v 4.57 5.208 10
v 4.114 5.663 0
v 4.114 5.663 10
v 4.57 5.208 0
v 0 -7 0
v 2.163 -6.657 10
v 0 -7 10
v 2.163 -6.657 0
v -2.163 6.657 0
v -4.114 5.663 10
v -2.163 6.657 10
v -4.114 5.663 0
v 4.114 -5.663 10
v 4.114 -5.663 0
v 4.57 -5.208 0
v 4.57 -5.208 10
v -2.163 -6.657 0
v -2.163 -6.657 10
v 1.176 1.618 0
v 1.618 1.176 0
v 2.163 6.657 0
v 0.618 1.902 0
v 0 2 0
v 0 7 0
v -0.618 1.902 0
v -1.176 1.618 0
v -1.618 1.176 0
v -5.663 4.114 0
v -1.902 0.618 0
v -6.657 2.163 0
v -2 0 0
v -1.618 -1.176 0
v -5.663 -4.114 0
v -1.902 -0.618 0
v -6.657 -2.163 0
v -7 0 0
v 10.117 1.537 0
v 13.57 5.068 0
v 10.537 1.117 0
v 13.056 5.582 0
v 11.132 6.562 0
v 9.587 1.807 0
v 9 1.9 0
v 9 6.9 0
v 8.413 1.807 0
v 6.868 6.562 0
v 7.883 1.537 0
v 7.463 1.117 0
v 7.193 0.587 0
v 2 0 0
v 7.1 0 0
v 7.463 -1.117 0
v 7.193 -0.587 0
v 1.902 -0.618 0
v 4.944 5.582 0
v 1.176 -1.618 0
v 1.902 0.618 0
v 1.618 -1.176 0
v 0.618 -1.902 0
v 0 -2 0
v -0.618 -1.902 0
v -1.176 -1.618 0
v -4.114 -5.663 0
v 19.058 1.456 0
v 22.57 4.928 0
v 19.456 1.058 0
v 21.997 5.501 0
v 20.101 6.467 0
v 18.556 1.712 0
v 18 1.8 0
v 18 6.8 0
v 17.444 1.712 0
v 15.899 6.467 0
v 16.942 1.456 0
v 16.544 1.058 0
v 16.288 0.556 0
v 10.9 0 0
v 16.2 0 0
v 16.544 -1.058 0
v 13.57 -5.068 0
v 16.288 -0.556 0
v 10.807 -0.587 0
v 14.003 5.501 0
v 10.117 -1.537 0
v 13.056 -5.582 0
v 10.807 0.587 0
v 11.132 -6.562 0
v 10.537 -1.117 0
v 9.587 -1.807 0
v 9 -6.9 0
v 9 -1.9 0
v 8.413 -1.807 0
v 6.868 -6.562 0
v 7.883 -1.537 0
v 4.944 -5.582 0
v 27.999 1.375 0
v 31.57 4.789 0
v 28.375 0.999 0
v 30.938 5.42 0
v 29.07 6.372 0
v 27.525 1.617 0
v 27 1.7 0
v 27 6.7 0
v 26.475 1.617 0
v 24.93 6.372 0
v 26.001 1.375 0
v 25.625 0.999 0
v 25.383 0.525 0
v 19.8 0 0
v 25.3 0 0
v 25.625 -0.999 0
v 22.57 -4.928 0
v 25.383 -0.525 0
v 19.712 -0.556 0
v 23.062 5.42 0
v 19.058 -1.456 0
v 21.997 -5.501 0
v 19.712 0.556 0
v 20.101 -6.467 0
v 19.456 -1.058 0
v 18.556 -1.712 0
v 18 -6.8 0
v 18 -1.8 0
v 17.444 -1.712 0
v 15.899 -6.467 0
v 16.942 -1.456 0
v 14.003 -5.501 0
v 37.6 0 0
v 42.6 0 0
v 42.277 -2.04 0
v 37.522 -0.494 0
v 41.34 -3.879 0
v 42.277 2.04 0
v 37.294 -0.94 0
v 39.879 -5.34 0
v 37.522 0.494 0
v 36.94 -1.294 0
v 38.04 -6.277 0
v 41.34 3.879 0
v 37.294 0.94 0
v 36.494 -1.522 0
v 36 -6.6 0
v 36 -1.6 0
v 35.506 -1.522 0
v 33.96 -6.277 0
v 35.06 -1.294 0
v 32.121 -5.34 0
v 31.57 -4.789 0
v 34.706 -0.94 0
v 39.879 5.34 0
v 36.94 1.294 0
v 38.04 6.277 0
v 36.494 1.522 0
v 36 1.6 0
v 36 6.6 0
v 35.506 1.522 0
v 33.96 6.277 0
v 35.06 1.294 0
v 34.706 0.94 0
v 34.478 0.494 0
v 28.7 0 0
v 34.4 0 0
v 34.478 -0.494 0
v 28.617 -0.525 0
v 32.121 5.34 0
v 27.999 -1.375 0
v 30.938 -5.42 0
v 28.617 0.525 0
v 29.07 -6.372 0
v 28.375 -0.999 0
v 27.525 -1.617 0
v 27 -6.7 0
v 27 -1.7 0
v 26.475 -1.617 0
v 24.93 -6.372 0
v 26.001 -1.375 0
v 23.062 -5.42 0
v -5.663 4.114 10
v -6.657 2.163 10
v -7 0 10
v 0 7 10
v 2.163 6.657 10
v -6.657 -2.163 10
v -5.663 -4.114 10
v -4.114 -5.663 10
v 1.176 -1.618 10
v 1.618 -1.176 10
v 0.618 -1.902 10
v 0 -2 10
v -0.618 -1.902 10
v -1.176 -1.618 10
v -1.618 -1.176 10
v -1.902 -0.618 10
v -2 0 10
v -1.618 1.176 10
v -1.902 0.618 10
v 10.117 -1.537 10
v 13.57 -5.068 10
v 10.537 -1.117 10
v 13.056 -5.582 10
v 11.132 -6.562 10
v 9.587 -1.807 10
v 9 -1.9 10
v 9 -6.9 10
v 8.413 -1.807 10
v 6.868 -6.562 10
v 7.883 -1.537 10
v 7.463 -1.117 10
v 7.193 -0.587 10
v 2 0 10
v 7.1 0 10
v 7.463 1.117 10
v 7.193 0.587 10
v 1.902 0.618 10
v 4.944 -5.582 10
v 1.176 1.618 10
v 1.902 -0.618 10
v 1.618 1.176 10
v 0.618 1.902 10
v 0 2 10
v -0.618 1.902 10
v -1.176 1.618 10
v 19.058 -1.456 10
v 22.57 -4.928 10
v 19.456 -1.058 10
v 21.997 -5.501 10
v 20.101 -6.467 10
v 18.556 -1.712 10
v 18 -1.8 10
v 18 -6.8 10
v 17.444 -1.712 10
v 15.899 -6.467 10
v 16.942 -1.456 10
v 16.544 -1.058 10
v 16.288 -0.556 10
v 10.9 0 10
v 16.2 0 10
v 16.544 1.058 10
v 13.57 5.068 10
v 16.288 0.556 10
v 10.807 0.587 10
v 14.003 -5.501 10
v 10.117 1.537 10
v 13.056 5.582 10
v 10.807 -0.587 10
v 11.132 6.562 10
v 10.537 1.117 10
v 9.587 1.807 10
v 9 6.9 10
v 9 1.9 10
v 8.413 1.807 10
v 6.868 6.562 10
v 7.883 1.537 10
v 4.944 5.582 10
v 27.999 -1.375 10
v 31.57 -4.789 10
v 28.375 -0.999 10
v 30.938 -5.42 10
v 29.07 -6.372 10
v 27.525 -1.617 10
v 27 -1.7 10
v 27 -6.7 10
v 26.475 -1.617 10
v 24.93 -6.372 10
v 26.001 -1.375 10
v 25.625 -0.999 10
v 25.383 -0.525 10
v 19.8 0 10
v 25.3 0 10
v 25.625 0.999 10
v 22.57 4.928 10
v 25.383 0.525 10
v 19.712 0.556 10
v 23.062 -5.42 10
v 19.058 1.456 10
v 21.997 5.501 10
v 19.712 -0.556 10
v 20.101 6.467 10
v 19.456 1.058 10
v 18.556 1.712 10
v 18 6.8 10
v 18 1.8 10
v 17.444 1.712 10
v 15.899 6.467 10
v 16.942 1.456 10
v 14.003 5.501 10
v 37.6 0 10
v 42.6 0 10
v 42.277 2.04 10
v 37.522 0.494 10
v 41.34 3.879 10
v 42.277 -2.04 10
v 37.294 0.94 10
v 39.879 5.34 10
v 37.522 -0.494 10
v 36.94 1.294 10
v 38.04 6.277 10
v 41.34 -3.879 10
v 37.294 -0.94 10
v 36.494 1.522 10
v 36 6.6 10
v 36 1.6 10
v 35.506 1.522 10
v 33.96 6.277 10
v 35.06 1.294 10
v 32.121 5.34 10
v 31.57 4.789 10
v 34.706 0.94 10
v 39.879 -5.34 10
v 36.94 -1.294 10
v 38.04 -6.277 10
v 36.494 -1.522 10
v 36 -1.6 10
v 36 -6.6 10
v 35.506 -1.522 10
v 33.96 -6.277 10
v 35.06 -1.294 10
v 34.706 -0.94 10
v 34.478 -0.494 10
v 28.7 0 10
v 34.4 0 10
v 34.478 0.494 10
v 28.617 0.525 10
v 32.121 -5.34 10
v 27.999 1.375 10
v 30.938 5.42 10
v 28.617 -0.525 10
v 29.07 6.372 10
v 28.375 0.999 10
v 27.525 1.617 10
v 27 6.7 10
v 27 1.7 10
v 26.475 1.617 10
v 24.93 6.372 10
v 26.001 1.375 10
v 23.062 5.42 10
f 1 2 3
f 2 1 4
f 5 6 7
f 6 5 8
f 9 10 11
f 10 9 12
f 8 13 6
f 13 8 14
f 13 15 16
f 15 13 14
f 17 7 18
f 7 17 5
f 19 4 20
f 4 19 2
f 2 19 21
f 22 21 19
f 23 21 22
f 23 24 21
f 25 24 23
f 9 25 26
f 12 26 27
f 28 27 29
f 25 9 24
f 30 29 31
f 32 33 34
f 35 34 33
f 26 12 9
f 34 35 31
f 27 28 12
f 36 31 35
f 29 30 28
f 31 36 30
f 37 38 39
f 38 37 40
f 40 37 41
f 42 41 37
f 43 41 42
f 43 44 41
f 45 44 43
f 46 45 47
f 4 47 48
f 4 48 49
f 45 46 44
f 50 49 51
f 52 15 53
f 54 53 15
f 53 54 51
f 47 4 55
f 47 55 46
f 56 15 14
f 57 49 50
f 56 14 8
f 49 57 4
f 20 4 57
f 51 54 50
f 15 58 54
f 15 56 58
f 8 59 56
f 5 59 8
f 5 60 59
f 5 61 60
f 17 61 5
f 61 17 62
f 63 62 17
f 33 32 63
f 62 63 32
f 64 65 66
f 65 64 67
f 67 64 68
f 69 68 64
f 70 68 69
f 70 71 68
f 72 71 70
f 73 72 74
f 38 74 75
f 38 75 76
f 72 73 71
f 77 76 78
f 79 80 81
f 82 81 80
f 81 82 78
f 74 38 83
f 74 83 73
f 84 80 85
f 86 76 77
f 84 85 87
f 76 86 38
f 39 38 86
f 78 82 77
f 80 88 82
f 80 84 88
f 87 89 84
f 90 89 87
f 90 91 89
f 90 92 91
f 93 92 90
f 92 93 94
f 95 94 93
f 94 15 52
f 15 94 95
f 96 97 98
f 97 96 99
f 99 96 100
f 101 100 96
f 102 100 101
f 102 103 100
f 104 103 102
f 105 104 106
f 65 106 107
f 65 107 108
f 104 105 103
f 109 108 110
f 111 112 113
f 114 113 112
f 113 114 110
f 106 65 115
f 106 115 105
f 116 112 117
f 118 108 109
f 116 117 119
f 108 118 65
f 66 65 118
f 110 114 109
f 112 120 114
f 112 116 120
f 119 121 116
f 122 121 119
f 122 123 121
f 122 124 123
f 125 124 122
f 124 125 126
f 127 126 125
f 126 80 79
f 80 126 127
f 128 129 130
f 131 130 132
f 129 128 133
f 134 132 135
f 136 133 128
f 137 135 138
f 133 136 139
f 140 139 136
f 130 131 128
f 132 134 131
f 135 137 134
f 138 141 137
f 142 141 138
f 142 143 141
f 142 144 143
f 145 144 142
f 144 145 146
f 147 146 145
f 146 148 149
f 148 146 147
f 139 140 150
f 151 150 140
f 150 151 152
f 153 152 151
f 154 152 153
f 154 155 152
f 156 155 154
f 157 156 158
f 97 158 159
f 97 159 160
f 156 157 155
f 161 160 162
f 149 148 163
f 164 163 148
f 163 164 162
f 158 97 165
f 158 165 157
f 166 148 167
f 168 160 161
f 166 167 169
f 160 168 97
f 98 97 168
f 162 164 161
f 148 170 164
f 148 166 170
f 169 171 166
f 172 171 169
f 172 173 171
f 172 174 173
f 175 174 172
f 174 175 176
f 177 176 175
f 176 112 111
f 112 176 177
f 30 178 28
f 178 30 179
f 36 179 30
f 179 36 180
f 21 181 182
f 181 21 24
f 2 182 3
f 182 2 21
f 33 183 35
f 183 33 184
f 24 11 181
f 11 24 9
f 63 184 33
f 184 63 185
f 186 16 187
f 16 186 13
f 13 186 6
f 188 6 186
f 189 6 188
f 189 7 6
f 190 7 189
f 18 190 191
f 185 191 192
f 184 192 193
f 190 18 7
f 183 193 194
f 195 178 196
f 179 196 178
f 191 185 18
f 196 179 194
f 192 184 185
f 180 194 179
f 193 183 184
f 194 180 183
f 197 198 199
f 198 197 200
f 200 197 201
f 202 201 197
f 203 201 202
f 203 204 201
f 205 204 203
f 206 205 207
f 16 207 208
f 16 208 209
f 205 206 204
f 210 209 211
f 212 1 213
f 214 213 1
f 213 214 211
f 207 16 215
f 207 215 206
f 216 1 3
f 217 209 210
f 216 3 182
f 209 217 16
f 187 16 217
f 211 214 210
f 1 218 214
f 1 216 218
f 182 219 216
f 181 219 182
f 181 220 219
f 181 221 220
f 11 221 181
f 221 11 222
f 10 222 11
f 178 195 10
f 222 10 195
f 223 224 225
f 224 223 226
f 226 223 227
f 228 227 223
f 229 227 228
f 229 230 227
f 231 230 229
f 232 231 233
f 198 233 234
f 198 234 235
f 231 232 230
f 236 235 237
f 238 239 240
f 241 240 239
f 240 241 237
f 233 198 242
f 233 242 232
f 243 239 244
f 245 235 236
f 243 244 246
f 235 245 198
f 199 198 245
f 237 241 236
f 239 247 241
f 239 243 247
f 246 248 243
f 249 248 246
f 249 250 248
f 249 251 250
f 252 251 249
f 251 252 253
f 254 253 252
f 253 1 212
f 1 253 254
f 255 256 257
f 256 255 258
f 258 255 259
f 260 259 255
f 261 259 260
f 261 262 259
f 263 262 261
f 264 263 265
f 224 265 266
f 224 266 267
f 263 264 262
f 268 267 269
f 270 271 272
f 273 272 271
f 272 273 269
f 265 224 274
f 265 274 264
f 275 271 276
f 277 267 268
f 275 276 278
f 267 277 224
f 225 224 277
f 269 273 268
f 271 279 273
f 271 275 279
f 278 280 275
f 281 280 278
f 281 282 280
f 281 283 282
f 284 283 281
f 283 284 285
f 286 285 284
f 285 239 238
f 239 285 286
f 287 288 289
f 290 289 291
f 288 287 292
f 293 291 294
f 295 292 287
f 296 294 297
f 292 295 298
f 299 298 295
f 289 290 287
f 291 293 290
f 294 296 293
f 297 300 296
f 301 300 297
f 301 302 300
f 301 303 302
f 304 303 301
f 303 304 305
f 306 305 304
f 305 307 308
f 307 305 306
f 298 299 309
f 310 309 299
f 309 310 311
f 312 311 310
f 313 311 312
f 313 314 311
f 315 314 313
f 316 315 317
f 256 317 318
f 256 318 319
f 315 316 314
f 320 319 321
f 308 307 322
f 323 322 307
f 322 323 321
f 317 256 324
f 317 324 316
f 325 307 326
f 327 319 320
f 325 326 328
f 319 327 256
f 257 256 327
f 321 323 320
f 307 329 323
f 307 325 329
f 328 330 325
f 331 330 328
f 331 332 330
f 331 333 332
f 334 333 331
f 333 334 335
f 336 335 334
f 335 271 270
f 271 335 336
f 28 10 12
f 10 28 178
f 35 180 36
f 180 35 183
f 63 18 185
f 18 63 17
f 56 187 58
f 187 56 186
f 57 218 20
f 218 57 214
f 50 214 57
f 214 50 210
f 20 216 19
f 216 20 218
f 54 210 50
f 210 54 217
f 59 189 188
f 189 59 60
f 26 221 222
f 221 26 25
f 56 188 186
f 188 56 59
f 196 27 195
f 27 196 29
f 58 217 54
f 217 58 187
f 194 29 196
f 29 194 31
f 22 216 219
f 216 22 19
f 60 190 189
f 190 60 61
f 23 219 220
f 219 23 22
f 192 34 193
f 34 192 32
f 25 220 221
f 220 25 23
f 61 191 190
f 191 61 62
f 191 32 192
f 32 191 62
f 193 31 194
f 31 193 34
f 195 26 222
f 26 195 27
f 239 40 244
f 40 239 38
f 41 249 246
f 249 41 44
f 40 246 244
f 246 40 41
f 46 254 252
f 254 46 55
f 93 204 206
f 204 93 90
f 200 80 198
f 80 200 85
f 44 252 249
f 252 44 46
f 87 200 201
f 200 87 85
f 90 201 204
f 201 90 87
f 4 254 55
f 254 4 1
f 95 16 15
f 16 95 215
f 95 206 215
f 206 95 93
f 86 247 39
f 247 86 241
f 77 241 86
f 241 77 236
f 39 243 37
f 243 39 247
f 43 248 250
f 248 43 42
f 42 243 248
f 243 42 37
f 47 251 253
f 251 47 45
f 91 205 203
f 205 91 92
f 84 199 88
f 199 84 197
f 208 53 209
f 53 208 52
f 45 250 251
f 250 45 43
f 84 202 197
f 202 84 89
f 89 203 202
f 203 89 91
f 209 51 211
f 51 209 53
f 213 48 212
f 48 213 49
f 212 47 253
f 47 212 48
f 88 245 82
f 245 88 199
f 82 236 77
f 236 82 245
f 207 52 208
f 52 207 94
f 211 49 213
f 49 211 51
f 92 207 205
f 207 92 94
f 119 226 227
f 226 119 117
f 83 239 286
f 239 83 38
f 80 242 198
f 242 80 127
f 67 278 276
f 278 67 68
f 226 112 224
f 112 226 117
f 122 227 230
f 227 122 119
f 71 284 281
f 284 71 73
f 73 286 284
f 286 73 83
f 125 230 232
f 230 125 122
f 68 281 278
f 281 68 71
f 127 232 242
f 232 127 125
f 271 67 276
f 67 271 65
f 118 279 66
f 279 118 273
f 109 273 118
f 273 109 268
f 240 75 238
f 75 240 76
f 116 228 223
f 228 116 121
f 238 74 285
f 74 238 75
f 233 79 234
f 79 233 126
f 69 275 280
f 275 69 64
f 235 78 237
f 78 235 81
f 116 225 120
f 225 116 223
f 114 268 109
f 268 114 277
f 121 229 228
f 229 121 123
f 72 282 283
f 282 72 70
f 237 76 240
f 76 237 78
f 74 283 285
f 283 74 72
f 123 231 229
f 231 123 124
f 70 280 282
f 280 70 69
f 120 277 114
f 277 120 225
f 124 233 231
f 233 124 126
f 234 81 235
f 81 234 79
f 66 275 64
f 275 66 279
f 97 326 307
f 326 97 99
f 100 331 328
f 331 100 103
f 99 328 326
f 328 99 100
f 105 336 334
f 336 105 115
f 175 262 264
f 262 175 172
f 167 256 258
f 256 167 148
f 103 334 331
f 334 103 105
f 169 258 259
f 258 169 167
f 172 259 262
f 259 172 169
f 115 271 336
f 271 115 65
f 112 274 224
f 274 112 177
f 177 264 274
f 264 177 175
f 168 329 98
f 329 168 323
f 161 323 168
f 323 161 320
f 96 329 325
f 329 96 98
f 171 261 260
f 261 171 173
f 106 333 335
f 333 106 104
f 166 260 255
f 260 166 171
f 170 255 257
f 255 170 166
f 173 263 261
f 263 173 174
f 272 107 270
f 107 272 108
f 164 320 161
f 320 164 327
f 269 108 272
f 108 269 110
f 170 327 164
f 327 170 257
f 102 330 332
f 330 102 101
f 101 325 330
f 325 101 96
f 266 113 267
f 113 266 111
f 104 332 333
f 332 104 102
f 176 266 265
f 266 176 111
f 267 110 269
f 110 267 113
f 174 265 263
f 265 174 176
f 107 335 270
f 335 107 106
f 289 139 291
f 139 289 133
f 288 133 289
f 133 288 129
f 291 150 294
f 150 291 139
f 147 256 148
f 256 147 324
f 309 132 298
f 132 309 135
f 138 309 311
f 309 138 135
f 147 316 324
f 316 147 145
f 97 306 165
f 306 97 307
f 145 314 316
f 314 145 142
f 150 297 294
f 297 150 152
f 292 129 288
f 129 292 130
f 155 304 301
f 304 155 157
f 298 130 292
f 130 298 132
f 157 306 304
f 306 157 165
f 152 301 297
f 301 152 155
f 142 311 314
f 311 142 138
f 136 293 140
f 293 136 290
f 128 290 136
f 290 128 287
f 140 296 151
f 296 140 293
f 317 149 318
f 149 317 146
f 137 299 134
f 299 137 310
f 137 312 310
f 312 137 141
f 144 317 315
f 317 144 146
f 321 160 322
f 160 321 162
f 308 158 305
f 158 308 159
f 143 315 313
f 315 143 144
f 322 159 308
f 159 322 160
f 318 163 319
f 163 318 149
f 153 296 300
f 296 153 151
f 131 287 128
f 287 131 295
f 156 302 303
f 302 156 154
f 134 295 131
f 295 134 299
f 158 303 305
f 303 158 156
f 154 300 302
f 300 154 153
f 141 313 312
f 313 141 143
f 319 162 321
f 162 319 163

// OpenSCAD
/* [Dimensions] */
wallThck=5;
minDia=3;
maxDia=4;
steps=5;
height=10;

/* [Hidden] */
fudge=0.1;
inc=(maxDia-minDia)/steps;

echo(inc);
$fn=20;

for (i=[0:steps-1]){
  dia=maxDia-inc*i;  
  translate([i*(maxDia+wallThck),0,0]) bore(dia);
}

module bore(dia){
  difference(){
    cylinder(d=dia+wallThck*2,h=height);
    translate([0,0,-fudge/2]) cylinder(d=dia,h=height+fudge);
  }
}
